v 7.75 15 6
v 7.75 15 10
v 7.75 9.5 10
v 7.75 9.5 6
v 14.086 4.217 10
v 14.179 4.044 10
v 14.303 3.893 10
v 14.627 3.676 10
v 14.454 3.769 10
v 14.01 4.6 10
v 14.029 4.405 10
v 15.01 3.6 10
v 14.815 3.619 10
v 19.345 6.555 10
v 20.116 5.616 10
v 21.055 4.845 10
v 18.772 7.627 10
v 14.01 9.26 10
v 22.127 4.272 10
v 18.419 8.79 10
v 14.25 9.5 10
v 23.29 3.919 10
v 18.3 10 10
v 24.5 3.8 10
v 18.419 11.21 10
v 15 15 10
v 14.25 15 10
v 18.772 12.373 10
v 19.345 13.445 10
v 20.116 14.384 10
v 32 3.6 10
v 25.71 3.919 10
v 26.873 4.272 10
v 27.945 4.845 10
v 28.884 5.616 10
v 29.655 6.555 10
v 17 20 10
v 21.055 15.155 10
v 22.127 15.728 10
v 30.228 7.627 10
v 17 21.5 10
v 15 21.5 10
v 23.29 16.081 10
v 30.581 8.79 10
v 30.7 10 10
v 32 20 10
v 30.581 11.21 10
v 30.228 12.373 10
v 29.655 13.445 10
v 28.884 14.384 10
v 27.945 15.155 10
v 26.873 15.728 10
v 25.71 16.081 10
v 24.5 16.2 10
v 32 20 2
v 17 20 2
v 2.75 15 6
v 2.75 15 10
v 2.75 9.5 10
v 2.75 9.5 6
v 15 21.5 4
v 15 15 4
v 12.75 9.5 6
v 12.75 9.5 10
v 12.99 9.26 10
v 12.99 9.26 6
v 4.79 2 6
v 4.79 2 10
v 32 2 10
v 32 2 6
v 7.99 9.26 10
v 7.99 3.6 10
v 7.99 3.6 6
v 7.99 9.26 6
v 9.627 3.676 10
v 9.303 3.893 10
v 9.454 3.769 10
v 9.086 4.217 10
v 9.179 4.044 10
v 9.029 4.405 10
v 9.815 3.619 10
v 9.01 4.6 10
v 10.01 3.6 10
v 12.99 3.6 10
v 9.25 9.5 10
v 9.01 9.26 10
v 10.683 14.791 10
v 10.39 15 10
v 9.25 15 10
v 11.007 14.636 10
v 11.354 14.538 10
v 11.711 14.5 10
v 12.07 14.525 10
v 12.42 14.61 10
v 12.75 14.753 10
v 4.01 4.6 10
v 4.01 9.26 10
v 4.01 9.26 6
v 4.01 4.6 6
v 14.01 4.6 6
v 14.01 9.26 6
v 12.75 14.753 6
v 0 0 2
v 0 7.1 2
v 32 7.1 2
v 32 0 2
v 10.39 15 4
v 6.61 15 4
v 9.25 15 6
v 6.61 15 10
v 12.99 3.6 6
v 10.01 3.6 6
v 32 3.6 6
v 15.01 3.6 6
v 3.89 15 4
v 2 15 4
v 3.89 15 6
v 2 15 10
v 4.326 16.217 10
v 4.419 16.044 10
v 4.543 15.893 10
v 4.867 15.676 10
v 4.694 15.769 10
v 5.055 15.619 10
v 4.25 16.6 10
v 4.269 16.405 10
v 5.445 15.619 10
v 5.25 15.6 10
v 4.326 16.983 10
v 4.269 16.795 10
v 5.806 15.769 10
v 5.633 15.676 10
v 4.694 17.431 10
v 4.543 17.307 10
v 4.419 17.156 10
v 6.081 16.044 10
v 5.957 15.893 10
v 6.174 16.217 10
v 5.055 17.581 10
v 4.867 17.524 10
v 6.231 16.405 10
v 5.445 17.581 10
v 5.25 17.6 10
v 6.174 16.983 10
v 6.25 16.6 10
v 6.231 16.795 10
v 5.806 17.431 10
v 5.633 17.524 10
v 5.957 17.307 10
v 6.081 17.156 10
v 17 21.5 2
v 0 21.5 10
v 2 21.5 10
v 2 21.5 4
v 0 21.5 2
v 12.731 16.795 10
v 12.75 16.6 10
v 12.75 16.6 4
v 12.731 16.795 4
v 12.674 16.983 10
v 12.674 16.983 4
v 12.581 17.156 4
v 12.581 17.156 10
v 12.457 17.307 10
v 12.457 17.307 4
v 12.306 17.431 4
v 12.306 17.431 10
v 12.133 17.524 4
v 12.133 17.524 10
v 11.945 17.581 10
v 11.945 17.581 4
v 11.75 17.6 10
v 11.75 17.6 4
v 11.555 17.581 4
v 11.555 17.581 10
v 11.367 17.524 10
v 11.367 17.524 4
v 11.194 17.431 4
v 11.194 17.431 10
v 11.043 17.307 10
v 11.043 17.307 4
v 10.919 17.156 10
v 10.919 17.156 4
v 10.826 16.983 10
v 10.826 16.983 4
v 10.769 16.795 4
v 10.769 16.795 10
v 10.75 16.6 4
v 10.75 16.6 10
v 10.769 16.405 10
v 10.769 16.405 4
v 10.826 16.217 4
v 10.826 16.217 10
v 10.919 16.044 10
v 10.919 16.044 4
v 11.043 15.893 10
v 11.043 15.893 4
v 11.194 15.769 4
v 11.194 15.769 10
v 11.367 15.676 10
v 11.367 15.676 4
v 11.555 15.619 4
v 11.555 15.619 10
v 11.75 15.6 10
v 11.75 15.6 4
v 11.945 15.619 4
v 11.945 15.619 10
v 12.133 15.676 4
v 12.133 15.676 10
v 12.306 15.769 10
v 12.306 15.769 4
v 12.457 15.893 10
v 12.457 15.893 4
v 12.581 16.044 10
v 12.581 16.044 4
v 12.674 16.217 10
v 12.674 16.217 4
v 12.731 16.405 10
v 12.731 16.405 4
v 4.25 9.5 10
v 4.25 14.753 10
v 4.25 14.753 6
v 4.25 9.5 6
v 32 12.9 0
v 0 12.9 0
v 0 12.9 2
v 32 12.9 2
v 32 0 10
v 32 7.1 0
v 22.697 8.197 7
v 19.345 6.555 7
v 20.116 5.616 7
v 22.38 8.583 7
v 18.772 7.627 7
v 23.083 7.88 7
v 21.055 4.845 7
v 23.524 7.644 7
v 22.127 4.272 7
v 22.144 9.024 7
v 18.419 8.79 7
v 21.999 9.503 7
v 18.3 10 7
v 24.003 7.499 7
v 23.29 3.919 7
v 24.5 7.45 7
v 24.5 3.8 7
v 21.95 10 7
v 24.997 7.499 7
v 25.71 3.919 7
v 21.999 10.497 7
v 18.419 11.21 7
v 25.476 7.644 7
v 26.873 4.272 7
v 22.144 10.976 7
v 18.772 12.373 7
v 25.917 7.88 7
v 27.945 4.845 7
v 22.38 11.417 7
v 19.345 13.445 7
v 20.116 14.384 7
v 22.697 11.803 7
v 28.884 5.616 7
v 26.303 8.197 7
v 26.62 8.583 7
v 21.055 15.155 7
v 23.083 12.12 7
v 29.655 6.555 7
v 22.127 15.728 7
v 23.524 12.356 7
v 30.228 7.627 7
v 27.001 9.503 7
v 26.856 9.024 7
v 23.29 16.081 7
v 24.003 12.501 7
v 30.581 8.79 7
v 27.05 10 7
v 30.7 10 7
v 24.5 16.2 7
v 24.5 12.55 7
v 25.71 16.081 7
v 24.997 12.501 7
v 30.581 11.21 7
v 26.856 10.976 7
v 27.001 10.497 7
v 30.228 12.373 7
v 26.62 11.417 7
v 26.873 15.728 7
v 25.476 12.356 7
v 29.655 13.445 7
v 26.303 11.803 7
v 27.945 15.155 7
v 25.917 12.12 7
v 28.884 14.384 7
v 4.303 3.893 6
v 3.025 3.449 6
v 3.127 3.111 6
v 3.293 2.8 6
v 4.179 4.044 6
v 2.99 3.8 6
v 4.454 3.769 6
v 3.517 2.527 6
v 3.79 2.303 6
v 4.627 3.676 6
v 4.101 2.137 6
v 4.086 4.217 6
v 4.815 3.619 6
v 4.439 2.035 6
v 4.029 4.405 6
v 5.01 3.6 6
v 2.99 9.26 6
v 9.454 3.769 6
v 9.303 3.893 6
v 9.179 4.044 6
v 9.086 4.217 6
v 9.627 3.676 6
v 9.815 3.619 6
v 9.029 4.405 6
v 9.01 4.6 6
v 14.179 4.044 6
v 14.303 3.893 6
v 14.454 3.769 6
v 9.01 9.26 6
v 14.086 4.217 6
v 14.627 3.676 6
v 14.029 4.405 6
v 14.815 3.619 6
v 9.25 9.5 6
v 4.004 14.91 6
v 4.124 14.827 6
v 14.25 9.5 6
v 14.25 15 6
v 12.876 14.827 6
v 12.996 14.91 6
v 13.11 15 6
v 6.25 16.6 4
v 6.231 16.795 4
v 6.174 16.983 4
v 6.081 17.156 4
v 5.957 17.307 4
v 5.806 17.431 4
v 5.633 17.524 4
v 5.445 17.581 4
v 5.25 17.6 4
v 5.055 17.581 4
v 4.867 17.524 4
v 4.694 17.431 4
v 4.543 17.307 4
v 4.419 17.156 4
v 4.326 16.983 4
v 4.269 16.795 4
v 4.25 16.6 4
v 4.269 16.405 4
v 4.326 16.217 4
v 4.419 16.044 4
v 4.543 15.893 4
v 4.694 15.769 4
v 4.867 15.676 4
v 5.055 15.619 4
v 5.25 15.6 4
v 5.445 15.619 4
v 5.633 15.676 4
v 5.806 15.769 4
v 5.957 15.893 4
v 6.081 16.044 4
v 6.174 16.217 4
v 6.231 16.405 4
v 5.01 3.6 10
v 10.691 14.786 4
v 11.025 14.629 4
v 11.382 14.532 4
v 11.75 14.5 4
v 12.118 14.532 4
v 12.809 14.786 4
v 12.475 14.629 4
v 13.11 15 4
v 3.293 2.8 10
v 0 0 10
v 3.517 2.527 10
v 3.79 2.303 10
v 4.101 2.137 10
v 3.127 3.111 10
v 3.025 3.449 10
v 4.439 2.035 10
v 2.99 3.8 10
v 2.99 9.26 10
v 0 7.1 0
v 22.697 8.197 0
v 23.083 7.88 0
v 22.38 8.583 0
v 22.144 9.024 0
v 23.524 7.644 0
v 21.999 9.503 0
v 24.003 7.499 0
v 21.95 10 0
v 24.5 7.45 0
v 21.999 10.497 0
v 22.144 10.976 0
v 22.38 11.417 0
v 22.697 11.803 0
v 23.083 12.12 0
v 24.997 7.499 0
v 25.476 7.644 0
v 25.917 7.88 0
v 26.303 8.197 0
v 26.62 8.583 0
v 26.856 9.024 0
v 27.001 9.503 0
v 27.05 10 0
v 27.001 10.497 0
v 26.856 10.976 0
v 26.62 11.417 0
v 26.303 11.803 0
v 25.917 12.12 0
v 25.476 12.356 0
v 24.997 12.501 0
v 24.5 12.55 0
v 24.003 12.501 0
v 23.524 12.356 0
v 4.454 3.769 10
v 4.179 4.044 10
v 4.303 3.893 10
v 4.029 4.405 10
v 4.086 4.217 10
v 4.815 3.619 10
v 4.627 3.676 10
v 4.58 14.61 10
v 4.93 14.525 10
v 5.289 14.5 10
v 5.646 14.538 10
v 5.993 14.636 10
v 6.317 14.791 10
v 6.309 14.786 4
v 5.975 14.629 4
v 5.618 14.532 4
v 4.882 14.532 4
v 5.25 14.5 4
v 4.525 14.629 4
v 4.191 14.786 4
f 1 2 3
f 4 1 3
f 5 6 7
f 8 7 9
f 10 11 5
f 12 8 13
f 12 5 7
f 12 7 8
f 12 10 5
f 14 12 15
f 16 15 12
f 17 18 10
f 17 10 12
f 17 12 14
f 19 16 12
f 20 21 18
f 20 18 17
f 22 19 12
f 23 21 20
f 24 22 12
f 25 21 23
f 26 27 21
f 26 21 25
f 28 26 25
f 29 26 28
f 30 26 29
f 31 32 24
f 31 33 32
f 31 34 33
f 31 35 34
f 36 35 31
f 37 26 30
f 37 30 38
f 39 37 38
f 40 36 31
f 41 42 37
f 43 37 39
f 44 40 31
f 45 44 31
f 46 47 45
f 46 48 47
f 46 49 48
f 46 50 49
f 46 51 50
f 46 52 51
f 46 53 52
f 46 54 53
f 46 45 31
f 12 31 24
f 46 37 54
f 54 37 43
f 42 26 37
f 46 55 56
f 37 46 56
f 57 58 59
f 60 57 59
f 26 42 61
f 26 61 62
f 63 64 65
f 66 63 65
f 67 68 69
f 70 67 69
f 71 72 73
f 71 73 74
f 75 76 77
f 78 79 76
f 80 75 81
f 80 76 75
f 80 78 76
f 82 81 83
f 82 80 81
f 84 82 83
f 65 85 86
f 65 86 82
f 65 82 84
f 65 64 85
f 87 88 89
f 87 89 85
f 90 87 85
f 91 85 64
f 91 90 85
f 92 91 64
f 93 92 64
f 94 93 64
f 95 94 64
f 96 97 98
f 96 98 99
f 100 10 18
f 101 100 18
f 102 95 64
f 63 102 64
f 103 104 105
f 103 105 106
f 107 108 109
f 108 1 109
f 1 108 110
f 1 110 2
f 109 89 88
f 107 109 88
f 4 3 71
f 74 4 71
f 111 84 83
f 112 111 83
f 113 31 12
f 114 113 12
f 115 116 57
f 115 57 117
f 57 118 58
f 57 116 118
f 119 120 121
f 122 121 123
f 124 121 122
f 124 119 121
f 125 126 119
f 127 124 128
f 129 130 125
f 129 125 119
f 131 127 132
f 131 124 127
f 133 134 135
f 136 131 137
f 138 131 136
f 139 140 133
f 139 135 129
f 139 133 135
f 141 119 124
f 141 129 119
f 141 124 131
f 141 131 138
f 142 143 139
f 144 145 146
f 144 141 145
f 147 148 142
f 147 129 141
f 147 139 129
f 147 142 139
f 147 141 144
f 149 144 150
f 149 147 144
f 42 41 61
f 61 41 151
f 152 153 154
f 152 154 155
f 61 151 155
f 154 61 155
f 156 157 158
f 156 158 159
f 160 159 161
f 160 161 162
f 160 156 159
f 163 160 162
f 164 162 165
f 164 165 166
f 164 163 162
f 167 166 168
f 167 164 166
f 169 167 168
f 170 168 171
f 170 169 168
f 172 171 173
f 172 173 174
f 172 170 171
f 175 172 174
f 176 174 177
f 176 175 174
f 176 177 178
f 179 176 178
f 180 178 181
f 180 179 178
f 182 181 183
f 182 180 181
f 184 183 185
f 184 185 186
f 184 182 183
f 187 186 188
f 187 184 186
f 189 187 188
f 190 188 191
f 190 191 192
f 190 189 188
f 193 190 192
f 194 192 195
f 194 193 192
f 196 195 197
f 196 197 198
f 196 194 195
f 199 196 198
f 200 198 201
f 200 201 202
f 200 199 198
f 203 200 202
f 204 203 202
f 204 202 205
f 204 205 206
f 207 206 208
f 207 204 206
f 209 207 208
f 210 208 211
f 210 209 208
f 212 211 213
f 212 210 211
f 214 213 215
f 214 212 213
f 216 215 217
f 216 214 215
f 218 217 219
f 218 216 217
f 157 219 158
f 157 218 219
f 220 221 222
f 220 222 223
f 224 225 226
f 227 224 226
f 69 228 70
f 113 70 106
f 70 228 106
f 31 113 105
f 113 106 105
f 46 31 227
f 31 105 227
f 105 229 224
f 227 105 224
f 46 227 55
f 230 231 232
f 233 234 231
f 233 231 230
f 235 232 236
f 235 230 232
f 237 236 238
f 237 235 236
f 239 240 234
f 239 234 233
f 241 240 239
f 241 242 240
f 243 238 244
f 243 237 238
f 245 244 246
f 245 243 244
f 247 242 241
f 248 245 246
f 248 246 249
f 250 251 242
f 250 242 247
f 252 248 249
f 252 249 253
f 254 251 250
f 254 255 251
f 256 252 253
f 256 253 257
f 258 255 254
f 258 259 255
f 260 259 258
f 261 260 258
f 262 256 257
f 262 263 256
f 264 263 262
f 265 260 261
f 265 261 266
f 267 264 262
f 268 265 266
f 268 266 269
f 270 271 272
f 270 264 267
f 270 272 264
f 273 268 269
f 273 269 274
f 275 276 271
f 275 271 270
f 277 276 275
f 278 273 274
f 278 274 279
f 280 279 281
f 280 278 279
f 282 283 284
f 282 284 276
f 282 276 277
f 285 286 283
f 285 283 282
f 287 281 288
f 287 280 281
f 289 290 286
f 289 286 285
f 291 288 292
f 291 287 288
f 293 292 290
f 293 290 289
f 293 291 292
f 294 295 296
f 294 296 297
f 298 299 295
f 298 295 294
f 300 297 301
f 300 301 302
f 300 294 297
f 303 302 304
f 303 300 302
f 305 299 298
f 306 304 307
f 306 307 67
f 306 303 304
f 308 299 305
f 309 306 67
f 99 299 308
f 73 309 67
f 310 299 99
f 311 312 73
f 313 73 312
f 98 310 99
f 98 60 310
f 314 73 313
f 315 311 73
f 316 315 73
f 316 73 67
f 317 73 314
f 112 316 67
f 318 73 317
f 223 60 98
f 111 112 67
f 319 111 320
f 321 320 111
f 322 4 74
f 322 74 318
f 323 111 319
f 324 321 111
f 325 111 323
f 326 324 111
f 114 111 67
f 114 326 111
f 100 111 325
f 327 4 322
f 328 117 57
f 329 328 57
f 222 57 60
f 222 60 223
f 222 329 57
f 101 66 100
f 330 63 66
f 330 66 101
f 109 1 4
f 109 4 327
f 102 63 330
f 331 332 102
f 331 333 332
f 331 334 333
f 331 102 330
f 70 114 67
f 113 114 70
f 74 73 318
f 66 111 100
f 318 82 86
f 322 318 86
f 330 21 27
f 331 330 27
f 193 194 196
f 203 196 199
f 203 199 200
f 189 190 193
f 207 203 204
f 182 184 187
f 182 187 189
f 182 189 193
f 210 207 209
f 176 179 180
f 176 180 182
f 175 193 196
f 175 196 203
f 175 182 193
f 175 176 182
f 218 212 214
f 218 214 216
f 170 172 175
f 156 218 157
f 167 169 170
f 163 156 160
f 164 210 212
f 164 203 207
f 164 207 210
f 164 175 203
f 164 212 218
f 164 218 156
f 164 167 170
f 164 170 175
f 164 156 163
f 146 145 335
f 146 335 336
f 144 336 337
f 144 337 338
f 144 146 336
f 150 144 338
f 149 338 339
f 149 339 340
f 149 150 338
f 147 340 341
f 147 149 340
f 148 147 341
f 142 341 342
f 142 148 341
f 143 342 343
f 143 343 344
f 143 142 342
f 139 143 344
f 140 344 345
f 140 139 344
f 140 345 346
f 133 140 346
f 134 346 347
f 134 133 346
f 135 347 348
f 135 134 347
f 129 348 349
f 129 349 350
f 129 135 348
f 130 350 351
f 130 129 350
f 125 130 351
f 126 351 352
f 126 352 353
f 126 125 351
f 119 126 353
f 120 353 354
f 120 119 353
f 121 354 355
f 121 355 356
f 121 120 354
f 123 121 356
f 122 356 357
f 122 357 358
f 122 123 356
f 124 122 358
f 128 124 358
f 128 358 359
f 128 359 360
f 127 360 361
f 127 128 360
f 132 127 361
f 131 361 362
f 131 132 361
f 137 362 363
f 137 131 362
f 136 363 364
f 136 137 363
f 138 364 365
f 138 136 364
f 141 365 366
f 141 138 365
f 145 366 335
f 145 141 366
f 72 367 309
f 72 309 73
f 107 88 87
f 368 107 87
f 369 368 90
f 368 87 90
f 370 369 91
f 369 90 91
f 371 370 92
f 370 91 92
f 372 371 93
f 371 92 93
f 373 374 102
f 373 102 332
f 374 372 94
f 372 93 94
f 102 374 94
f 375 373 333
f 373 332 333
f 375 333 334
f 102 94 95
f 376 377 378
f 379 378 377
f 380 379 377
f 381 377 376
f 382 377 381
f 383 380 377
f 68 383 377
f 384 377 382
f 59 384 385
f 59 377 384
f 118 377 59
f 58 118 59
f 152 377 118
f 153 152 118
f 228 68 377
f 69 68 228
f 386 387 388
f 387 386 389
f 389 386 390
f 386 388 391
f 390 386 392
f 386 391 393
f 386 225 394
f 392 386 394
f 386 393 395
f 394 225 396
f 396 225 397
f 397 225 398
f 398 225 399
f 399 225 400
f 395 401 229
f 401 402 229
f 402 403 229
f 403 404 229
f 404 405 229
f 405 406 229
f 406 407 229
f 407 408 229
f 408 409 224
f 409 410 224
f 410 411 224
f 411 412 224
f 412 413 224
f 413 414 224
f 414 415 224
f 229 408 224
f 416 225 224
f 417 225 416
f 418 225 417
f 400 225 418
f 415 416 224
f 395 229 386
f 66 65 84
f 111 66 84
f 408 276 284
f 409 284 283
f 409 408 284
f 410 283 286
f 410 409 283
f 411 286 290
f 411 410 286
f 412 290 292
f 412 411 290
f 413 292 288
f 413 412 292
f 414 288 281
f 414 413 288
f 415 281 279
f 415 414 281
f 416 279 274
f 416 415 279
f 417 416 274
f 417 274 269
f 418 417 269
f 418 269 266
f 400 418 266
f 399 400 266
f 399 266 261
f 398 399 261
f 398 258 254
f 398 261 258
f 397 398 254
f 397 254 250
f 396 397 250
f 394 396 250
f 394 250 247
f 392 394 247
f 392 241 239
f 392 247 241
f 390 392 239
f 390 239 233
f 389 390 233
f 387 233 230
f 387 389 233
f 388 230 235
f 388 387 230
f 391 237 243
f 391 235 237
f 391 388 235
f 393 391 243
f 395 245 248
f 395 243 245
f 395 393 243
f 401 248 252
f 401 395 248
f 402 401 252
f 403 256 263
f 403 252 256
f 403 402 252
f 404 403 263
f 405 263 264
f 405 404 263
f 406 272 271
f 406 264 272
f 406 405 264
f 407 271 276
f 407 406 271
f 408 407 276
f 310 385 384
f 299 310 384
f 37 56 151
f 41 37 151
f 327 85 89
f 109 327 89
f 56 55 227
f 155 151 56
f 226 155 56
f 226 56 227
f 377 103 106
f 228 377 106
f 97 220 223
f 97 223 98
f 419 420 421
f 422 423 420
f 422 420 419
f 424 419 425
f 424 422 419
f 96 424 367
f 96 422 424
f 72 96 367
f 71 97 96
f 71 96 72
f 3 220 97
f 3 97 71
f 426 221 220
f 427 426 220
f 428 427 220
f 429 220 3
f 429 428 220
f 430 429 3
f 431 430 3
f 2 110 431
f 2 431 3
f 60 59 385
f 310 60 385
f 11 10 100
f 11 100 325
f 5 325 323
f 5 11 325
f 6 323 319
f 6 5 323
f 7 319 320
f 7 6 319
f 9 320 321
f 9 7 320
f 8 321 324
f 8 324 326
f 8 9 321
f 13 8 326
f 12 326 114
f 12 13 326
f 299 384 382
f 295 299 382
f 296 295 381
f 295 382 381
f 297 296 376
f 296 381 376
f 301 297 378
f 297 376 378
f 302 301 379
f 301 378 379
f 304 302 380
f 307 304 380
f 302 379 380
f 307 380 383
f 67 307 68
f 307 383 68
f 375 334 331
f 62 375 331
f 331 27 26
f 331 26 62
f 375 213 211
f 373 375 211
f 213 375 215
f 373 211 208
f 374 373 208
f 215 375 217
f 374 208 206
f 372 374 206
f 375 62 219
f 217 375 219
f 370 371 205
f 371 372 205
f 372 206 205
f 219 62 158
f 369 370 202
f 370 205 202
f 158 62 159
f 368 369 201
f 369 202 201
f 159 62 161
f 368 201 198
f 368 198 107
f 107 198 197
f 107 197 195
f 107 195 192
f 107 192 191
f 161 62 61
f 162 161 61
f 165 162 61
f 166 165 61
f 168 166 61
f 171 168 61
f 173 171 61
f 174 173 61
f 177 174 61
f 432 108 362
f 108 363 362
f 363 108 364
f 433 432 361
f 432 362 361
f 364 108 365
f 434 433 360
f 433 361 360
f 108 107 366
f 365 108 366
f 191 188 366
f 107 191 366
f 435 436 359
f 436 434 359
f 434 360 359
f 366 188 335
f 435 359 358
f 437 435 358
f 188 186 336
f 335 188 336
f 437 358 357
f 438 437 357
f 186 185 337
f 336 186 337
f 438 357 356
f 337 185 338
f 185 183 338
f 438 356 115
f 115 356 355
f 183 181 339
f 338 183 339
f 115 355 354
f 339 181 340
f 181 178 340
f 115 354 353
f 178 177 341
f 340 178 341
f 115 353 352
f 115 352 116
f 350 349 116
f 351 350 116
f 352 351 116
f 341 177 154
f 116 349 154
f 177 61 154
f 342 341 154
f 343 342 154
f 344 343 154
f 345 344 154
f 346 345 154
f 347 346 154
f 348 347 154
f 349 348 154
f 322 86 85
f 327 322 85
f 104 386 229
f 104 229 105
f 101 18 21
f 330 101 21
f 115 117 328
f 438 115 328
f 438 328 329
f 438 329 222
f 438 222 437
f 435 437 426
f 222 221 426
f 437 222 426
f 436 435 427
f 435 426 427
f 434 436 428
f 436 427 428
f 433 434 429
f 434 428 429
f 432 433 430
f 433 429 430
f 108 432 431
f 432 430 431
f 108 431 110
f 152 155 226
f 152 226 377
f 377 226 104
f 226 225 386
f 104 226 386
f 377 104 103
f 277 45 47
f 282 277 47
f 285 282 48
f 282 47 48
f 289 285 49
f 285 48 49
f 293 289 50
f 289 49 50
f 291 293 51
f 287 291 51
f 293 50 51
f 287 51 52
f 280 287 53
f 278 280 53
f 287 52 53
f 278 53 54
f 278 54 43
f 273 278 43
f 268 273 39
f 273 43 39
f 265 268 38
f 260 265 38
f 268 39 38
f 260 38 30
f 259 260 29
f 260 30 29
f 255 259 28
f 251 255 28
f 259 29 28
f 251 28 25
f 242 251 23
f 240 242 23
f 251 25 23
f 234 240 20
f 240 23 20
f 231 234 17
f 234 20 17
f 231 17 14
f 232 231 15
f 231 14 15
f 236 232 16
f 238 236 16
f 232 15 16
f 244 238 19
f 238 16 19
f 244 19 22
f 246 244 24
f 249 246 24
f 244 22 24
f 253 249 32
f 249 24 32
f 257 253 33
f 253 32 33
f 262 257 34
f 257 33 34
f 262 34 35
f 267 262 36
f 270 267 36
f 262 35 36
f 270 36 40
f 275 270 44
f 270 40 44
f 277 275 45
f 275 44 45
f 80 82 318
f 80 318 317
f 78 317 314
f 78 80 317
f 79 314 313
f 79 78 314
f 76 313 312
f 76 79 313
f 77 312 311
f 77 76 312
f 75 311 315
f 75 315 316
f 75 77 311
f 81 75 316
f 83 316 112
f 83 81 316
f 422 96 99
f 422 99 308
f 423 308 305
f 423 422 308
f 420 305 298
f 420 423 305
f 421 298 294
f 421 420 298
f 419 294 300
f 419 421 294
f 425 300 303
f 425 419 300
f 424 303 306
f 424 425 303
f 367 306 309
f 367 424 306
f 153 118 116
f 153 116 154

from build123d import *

# Parameters (mm, degrees)
SKETCH_R        = 2.55
PAD_DEPTH       = 10
SKETCH001_R     = 1
POCKET_DEPTH    = 6
SKETCH002_W     = 8.6
SKETCH002_H     = 2
SKETCH002_W_2   = 7.1
POCKET001_DEPTH = 32.001
POCKET002_DEPTH = 4
SKETCH004_R     = 6.2
POCKET003_DEPTH = 3


with BuildPart() as part:
    # Sketch → Pad (new body)
    with BuildSketch(Plane.XY):
        Polygon((0, 21.5), (0, 0), (32, 0), (32, 20), (17, 20), (17, 21.5), align=None)
        with Locations((24.5, 10)):
            Circle(SKETCH_R, mode=Mode.SUBTRACT)
    extrude(amount=PAD_DEPTH)

    # Sketch001 (on Face9 of Pad) → Pocket (cut)
    with BuildSketch(Plane.XY.offset(10)):
        with BuildLine():
            Line((2, 21.5), (15, 21.5))
            Line((15, 21.5), (15, 15))
            Line((13.110147, 15), (15, 15))
            ThreePointArc((10.389853, 15), (11.75, 14.5), (13.110147, 15))
            Line((8.5, 15), (10.389853, 15))
            Line((8.5, 15), (6.610147, 15))
            ThreePointArc((3.889853, 15), (5.25, 14.5), (6.610147, 15))
            Line((2, 15), (3.889853, 15))
            Line((2, 15), (2, 21.5))
        make_face()
        with Locations((5.25, 16.6)):
            Circle(SKETCH001_R, mode=Mode.SUBTRACT)
        with Locations((11.75, 16.6)):
            Circle(SKETCH001_R, mode=Mode.SUBTRACT)
    extrude(amount=-POCKET_DEPTH, mode=Mode.SUBTRACT)

    # Sketch002 (on Face1 of Pocket) → Pocket001 (cut, through all)
    with BuildSketch(Plane(origin=(0, 0, 0), x_dir=(0, -1, 0), z_dir=(-1, 0, 0))):
        with Locations((-17.2, 1)):
            Rectangle(SKETCH002_W, SKETCH002_H)
        with Locations((-3.55, 1)):
            Rectangle(SKETCH002_W_2, SKETCH002_H)
    extrude(amount=-POCKET001_DEPTH, mode=Mode.SUBTRACT)

    # Sketch003 (on Face8 of Pocket001) → Pocket002 (cut)
    with BuildSketch(Plane.XY.offset(10)):
        with BuildLine():
            Line((7.75, 15), (7.75, 9.5))
            Line((7.75, 9.5), (7.99, 9.26))
            Line((7.99, 3.6), (7.99, 9.26))
            Line((5.01, 3.6), (7.99, 3.6))
            ThreePointArc((4.01, 4.6), (4.302893, 3.892893), (5.01, 3.6))
            Line((4.01, 9.26), (4.01, 4.6))
            Line((4.25, 9.5), (4.01, 9.26))
            Line((4.25, 15), (4.25, 9.5))
            Line((2.75, 15), (4.25, 15))
            Line((2.75, 15), (2.75, 9.5))
            Line((2.75, 9.5), (2.99, 9.26))
            Line((2.99, 9.26), (2.99, 3.8))
            ThreePointArc((2.99, 3.8), (3.517208, 2.527208), (4.79, 2))
            Line((4.79, 2), (32, 2))
            Line((32, 2), (32, 3.6))
            Line((32, 3.6), (15.01, 3.6))
            ThreePointArc((14.01, 4.6), (14.302893, 3.892893), (15.01, 3.6))
            Line((14.01, 4.6), (14.01, 9.26))
            Line((14.01, 9.26), (14.25, 9.5))
            Line((14.25, 9.5), (14.25, 15))
            Line((14.25, 15), (12.75, 15))
            Line((12.75, 15), (12.75, 9.5))
            Line((12.75, 9.5), (12.99, 9.26))
            Line((12.99, 9.26), (12.99, 3.6))
            Line((12.99, 3.6), (10.01, 3.6))
            ThreePointArc((9.01, 4.6), (9.302893, 3.892893), (10.01, 3.6))
            Line((9.01, 4.6), (9.01, 9.26))
            Line((9.01, 9.26), (9.25, 9.5))
            Line((9.25, 9.5), (9.25, 15))
            Line((9.25, 15), (7.75, 15))
        make_face()
    extrude(amount=-POCKET002_DEPTH, mode=Mode.SUBTRACT)

    # Sketch004 (on Face23 of Pocket002) → Pocket003 (cut)
    with BuildSketch(Plane.XY.offset(10)):
        with Locations((24.5, 10)):
            Circle(SKETCH004_R)
    extrude(amount=-POCKET003_DEPTH, mode=Mode.SUBTRACT)


solid = part.part
